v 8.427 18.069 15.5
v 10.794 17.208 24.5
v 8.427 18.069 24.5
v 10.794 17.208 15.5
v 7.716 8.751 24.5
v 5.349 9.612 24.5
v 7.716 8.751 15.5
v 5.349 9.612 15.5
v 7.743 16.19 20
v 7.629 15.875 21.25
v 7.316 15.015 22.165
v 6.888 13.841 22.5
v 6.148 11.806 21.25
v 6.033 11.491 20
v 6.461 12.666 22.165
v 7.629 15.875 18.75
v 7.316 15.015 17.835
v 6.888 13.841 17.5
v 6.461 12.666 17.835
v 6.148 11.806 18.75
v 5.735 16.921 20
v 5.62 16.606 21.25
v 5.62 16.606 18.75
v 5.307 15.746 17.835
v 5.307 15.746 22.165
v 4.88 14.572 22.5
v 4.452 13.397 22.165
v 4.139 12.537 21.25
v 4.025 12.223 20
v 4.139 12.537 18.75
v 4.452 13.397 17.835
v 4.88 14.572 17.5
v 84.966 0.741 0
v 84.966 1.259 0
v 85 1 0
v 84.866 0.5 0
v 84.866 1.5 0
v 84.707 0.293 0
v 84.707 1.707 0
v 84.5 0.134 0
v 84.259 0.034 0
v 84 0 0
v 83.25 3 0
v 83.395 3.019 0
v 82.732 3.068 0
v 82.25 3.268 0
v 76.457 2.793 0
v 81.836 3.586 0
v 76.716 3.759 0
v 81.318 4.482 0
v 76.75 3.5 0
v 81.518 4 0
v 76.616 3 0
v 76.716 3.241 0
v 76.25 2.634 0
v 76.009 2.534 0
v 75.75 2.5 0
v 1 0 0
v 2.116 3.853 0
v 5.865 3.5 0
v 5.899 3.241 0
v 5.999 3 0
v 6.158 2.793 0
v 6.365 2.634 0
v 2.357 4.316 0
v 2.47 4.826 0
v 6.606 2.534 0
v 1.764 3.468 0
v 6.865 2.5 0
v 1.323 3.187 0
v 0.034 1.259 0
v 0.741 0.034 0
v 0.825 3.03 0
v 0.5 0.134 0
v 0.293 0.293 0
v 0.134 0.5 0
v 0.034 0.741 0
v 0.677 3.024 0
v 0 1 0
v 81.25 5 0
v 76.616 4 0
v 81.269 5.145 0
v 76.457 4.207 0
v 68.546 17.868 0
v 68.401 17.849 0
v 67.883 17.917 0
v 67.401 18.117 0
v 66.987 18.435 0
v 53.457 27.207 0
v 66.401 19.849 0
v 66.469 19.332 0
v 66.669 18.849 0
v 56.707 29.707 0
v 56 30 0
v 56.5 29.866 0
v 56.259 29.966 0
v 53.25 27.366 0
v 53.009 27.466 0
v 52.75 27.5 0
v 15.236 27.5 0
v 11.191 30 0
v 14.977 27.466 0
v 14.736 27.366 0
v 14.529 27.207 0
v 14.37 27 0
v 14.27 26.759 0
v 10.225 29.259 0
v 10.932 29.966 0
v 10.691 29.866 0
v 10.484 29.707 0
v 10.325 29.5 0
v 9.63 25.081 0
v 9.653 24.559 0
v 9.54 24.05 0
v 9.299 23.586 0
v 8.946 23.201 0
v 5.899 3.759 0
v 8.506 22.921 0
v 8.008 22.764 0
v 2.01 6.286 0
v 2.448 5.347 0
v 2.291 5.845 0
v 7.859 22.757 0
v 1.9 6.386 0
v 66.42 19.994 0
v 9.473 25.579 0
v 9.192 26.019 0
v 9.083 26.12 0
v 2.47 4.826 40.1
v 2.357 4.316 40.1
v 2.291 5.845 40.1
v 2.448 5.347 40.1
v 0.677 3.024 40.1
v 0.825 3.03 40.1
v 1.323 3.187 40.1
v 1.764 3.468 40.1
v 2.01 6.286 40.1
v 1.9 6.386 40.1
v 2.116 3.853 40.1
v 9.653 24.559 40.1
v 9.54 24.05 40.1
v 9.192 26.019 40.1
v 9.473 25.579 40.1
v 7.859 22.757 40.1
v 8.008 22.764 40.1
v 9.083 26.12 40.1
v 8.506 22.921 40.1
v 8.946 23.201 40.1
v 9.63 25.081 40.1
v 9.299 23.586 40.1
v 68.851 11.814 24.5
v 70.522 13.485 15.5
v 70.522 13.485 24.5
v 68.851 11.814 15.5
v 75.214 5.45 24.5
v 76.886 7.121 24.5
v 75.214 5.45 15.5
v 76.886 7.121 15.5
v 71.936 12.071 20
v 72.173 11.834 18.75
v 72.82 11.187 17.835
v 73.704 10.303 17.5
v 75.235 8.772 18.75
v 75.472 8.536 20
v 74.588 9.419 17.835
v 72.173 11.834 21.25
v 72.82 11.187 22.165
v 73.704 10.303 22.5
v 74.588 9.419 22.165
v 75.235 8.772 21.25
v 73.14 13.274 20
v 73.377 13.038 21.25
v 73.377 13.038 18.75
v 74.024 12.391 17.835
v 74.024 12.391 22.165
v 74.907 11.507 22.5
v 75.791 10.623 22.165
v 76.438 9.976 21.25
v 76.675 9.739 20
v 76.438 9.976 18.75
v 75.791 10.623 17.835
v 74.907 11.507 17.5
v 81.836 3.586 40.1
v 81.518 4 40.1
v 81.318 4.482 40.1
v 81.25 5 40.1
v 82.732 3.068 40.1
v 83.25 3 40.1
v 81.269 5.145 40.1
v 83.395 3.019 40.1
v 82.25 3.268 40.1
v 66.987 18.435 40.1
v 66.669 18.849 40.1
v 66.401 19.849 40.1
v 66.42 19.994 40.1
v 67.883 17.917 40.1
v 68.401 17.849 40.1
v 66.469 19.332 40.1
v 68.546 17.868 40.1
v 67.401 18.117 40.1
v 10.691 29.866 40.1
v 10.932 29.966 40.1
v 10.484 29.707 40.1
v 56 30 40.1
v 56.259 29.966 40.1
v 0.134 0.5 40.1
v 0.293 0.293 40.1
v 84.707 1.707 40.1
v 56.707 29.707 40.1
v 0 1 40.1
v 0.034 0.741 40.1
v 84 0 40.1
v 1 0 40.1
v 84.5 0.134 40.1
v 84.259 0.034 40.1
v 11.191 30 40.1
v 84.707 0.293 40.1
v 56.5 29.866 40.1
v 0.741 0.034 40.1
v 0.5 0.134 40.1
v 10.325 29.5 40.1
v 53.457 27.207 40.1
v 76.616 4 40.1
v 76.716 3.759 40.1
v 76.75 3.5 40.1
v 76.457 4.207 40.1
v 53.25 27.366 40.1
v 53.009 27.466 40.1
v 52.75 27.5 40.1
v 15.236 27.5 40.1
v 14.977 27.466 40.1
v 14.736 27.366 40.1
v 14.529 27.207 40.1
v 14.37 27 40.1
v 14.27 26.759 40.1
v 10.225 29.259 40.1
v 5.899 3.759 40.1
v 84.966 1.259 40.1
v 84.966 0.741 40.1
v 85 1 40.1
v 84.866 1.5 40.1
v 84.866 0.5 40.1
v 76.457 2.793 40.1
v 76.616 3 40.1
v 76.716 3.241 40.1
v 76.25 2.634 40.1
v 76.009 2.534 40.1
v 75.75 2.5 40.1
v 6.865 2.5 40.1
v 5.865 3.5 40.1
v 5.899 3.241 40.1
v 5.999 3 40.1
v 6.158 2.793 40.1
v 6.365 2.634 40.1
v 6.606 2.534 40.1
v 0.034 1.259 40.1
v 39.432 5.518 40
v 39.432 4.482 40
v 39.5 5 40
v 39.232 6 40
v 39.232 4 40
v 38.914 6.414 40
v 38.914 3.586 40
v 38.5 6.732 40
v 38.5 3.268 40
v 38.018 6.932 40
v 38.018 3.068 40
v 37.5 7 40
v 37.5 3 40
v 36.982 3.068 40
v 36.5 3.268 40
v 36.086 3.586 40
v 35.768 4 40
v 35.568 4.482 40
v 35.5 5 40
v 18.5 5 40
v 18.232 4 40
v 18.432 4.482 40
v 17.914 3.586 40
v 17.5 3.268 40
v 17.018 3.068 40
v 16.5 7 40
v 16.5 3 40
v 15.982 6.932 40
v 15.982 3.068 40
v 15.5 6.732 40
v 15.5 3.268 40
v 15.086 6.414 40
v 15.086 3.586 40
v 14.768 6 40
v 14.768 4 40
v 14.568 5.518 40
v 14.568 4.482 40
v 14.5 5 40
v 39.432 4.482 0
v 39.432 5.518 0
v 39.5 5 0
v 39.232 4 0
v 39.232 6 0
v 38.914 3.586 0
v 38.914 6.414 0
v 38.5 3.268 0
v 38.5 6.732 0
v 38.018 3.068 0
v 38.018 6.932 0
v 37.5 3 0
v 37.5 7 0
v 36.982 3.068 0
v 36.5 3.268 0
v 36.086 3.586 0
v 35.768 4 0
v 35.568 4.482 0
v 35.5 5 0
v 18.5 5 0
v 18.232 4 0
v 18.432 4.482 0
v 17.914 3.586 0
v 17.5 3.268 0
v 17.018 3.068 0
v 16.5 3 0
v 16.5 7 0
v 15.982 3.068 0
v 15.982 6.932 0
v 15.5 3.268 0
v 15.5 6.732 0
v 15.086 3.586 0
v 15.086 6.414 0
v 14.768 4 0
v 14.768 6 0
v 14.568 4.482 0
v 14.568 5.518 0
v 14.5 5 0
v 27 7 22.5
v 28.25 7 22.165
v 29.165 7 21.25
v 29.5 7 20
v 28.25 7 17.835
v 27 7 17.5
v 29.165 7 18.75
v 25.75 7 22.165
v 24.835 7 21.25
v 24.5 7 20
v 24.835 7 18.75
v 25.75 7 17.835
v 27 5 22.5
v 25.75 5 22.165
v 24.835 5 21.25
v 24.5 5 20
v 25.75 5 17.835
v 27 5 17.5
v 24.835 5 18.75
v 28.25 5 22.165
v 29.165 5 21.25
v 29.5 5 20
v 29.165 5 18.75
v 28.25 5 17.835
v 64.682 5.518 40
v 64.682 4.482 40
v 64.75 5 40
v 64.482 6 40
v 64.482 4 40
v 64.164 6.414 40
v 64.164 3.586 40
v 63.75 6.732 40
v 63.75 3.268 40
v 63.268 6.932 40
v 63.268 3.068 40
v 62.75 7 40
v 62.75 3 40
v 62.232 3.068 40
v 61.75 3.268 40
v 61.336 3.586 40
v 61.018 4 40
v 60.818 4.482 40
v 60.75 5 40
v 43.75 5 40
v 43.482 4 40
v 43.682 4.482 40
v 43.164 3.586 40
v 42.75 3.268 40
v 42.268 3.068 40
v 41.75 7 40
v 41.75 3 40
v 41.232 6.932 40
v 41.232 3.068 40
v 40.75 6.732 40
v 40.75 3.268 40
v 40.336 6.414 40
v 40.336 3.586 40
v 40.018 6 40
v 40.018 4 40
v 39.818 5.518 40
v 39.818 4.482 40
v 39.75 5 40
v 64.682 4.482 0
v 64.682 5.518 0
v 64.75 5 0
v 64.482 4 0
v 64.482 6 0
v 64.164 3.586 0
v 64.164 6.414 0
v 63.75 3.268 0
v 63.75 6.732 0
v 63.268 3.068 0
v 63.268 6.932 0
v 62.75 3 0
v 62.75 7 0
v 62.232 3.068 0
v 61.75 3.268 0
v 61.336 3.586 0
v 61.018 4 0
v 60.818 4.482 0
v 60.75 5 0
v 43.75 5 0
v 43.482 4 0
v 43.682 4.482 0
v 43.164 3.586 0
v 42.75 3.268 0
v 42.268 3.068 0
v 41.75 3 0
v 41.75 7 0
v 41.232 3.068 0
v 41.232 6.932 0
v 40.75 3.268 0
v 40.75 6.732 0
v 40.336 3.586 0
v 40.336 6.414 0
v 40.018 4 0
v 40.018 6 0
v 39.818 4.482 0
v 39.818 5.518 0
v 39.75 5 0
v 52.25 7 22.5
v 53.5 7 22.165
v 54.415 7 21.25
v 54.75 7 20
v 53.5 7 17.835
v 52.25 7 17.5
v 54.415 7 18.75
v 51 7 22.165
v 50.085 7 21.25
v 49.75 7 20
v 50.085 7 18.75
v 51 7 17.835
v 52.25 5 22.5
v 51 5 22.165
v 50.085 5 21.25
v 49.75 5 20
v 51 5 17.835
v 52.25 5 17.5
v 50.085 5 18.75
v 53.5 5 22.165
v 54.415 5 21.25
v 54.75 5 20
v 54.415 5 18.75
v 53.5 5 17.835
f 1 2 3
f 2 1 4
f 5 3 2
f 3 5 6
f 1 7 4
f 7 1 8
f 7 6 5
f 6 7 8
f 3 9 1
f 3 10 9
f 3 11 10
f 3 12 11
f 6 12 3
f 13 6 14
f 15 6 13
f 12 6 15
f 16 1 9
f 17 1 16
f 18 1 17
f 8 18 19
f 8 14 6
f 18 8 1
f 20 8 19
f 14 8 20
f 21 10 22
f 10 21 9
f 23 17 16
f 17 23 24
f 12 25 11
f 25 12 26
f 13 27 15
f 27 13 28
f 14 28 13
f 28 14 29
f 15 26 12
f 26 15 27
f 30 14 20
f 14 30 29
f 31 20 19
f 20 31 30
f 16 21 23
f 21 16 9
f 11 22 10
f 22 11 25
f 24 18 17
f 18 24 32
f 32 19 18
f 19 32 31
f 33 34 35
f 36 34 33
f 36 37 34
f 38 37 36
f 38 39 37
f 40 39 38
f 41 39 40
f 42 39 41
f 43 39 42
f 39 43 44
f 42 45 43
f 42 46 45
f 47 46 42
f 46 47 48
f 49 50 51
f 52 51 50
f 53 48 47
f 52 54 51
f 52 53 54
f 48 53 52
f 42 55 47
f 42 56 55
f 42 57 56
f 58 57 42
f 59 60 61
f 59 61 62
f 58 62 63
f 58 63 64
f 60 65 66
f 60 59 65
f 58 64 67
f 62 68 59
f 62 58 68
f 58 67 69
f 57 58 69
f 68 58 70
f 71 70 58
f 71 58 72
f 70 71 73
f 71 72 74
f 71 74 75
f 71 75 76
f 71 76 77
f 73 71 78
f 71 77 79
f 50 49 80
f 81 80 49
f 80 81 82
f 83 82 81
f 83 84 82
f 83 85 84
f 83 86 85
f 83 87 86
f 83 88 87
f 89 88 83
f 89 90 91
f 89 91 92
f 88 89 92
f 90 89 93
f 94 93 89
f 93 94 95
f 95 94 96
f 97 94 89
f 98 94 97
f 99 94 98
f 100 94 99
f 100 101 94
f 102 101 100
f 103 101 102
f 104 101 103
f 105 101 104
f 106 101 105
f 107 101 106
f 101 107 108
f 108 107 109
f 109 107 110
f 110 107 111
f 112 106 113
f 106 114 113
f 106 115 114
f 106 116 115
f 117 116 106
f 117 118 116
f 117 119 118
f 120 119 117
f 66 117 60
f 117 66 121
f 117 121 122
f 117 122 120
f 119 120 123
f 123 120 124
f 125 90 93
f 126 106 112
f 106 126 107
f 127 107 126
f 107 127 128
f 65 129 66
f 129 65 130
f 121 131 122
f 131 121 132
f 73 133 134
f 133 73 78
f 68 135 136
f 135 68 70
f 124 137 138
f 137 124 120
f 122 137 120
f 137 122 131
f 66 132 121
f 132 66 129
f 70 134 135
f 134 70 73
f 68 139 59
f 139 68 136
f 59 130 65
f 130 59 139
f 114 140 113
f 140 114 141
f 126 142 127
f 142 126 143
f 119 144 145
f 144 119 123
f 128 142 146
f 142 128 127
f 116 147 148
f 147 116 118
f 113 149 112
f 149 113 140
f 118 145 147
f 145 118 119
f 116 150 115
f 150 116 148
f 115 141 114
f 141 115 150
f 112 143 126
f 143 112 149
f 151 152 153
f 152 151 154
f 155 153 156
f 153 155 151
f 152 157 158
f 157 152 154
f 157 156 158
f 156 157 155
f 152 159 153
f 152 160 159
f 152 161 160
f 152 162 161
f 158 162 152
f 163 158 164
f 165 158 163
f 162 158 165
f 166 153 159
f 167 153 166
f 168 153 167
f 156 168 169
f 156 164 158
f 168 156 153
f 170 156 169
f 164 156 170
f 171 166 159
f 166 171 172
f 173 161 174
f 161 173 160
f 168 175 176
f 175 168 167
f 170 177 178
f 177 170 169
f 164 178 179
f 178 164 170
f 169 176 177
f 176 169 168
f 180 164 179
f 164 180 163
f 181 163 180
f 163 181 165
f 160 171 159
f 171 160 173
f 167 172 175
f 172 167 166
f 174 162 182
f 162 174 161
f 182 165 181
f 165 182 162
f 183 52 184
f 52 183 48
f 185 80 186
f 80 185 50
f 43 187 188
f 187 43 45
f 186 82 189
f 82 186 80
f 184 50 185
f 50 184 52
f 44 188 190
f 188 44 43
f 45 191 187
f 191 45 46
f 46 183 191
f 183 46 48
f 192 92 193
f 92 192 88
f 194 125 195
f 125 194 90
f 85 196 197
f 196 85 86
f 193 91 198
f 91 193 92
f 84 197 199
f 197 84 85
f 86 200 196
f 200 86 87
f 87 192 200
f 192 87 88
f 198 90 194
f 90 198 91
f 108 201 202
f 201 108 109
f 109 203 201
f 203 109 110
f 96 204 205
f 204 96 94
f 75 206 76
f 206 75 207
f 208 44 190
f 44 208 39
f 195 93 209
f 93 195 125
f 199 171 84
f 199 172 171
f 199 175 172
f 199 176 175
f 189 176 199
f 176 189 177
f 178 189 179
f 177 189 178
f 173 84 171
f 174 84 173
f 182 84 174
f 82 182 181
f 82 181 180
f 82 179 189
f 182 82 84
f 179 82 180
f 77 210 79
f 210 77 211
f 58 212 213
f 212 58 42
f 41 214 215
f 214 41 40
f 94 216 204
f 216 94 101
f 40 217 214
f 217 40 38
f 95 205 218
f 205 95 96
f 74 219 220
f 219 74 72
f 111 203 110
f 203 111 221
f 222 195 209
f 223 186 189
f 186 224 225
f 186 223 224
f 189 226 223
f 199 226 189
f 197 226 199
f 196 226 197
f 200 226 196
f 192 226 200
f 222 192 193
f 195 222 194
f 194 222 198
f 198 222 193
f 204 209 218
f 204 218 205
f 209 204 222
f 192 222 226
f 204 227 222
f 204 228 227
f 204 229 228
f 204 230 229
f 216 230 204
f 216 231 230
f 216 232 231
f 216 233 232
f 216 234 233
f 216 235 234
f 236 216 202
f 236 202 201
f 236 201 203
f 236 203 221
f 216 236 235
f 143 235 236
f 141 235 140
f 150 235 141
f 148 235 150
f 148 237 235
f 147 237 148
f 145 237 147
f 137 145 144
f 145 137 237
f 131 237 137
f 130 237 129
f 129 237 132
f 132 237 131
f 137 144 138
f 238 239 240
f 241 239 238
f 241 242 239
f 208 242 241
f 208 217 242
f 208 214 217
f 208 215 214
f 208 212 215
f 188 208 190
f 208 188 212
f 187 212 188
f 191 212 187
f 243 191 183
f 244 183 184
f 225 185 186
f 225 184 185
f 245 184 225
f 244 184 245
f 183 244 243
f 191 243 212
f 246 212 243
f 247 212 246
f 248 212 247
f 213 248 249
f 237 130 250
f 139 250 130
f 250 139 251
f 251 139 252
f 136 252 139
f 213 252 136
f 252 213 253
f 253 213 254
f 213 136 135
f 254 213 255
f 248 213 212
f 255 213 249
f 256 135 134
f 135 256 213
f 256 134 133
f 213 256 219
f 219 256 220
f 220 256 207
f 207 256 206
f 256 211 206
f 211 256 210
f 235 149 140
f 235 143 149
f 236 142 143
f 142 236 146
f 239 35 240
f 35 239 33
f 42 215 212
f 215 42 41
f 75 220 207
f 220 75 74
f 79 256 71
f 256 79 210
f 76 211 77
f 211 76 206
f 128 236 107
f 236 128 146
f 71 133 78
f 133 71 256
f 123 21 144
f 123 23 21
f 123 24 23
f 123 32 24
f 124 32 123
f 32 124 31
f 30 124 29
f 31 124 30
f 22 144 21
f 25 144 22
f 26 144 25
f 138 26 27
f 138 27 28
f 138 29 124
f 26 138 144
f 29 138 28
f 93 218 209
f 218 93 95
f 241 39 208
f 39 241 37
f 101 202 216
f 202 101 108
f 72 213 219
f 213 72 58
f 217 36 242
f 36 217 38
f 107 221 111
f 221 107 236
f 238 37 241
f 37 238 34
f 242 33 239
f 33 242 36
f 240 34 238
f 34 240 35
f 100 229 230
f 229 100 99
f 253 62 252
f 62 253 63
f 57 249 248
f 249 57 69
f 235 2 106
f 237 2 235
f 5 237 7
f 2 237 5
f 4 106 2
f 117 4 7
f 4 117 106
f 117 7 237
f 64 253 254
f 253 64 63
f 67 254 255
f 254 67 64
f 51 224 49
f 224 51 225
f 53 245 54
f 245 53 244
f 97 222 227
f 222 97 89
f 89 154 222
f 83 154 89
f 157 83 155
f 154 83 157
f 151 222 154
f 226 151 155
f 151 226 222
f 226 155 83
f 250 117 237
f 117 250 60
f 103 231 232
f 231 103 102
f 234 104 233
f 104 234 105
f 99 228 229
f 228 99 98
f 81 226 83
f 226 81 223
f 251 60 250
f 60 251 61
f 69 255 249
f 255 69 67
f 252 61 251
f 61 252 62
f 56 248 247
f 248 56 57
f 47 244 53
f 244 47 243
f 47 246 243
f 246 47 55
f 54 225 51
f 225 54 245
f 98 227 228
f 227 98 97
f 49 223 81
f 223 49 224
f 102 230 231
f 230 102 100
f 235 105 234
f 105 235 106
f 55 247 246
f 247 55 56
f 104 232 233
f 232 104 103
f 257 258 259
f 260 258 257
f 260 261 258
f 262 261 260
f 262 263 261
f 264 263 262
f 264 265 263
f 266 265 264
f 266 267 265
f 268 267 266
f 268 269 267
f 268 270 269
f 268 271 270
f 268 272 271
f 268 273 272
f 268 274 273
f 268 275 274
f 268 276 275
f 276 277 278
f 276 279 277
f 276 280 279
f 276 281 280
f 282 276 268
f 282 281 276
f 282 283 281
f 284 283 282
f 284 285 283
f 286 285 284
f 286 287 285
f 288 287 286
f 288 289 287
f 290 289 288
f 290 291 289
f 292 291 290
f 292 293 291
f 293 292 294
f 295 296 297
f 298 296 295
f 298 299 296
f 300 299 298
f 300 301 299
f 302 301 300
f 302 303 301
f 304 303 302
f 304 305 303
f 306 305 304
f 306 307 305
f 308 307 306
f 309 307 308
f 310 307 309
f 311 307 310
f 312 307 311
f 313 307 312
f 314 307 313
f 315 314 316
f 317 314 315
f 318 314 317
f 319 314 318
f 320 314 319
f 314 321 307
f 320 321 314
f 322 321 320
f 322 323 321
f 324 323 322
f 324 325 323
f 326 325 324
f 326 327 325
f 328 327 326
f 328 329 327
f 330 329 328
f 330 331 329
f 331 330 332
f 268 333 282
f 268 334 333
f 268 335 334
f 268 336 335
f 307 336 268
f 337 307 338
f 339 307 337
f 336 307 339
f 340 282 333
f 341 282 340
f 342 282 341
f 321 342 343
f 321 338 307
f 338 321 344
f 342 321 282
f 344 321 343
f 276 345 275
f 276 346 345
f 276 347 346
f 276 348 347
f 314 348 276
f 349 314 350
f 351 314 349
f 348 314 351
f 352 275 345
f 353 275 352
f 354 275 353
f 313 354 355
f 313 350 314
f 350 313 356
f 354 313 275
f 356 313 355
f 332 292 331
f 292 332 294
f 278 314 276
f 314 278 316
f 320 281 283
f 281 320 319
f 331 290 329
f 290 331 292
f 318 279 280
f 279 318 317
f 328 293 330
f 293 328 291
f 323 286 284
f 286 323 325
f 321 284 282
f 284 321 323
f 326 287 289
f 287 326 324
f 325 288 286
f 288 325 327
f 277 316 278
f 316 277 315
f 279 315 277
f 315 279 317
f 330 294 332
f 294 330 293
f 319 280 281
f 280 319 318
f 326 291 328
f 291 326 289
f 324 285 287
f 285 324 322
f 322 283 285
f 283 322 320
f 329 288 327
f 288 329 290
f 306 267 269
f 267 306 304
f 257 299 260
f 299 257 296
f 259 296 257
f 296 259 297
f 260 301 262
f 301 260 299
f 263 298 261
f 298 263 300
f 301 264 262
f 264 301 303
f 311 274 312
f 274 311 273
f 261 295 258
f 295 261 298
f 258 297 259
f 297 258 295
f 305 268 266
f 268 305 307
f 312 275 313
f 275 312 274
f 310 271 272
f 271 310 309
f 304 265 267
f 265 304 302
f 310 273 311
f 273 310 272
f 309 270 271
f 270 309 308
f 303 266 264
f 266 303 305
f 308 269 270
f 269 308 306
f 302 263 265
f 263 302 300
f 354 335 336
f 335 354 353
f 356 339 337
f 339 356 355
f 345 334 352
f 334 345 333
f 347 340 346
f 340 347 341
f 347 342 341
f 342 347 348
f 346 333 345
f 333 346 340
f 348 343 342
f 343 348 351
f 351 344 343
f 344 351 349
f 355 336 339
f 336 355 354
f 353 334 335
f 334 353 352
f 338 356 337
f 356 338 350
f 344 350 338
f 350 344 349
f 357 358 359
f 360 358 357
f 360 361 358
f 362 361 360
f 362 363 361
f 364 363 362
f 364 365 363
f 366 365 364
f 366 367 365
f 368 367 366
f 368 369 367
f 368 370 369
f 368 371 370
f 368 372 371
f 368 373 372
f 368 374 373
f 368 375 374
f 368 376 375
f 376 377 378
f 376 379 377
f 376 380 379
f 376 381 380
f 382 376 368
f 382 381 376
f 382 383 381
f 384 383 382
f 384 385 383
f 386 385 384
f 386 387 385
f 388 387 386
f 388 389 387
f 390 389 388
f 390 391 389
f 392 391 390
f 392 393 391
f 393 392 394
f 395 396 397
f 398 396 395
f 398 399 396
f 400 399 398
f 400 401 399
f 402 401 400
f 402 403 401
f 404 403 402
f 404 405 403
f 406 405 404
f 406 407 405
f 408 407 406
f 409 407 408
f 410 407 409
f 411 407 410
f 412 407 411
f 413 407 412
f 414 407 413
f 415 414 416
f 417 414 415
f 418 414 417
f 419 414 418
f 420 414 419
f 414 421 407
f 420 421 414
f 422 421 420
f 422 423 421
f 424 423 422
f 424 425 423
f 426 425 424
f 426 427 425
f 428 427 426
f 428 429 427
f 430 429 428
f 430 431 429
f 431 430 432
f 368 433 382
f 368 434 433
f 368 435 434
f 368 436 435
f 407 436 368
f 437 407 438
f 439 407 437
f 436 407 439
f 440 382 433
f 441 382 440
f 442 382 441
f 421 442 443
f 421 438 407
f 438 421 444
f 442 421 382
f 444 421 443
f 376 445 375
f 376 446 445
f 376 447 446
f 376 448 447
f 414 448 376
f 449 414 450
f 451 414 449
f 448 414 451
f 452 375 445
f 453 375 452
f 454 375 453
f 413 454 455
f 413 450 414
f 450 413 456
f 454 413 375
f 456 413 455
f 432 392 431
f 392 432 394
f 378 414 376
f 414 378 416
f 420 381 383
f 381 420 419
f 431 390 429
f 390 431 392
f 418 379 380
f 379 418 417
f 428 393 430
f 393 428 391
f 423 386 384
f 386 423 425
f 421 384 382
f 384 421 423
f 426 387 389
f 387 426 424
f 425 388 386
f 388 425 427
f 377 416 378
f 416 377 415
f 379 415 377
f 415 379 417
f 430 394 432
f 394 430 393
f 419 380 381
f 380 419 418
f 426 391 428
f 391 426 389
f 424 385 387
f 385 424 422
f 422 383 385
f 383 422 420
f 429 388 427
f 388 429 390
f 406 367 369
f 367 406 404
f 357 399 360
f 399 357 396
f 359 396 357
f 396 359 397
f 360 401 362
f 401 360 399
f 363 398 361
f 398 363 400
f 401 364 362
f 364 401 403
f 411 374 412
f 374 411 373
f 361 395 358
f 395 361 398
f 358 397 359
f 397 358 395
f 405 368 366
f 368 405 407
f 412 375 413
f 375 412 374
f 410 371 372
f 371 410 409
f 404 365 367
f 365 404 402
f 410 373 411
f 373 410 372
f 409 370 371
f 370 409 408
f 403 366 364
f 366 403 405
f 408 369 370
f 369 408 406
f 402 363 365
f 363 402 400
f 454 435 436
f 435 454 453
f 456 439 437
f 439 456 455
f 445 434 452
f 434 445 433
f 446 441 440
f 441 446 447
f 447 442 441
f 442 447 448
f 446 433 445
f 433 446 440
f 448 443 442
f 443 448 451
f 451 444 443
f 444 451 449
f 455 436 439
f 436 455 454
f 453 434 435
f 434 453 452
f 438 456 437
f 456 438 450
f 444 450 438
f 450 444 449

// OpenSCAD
width = 40;
length = 85;
height = 30;
thickness = 2.5;
extraEndThickness = 2;
endRadius = 1;
backAngle = 70;
frontAngle = 45;
middle_radius = 4;
clipThickness = 2;
clipWidth = 25;
clipEndRadius = 2;
nutHoleWidth = 9;
nutHoleInset = 3;
boltHoleDiameter = 5;

module round4CornersCube(x,y,z,r) {
	translate([r, r, 0])
        minkowski() {
			cube([x - 2 * r, y - 2 * r, z]);
			cylinder(r=r, h=0.1);
        }
}

module clip(cutout) {
	centerToCenter = clipWidth - clipEndRadius * 2;
	difference() {
		union() {
			translate([0, clipEndRadius - clipThickness, 0])
				cube([centerToCenter, clipThickness, width + cutout]);
			cylinder(r=clipEndRadius, h=width + cutout, $fn=24);
			translate([centerToCenter, 0, 0])
				cylinder(r=clipEndRadius, h=width + cutout, $fn=24);
			if (cutout) {
				nutBoreDepth = thickness + extraEndThickness + 2;
				translate([(centerToCenter - nutHoleWidth) / 2,  - nutBoreDepth, (width - nutHoleWidth) / 2])
					cube([nutHoleWidth, nutBoreDepth - nutHoleInset, nutHoleWidth]);
				translate([centerToCenter / 2, clipThickness, width / 2])
					rotate([90, 0, 0])
						cylinder(d=boltHoleDiameter, h=nutBoreDepth + nutHoleInset, $fn=12);
			}
		}
		if (!cutout) {
			translate([centerToCenter / 2, clipThickness, width / 2])
				rotate([90, 0, 0])
					cylinder(d=boltHoleDiameter, h=10, $fn=12);
		}
	}
}

module simpleBlock(inset, extraWidth) {
	backAdj = 1.5 * tan(90 - backAngle);
	frontAdj = 1.5 * tan(90 - frontAngle);
	minkLength = length - (inset ? extraEndThickness * 2 : 0) - inset * (2 + backAdj + frontAdj) - endRadius * 2;
	minkHeight = height - inset * 2 - endRadius * 2;
	translate([endRadius + inset * backAdj + (inset ? extraEndThickness : 0), endRadius, 0])
		minkowski() {
			linear_extrude(height=width + extraWidth, convexity=5) {
				polygon(paths=[[0, 1, 2, 3]],
					points=[[0, 0], [minkLength, 0], [minkLength - tan(90 - frontAngle) * minkHeight, minkHeight], [tan(90 - backAngle) * minkHeight, minkHeight]]);
			}
			cylinder(r=endRadius, h=0.1, $fn=24);
		}
}

module block() {
	difference() {
		simpleBlock(0, 0);
		translate([thickness, thickness, -1])
			simpleBlock(thickness, 2);
		translate([2 * tan(90 - backAngle) - 0.25, thickness * 2, 0])
			rotate([0, 0, backAngle])
				clip(1);
		translate([length + 0.25 - 2 * tan(90 - frontAngle), thickness * 2, 0])
			rotate([0, 0, 180 - frontAngle])
				mirror([0, 1, 0])
					clip(1);
	}
}

block();
translate([thickness + extraEndThickness + clipThickness + 10, thickness + clipThickness + 0.5, 0]) {
	clip(0);
	translate([clipWidth + 0.25, 0, 0])
		clip(0);
}
